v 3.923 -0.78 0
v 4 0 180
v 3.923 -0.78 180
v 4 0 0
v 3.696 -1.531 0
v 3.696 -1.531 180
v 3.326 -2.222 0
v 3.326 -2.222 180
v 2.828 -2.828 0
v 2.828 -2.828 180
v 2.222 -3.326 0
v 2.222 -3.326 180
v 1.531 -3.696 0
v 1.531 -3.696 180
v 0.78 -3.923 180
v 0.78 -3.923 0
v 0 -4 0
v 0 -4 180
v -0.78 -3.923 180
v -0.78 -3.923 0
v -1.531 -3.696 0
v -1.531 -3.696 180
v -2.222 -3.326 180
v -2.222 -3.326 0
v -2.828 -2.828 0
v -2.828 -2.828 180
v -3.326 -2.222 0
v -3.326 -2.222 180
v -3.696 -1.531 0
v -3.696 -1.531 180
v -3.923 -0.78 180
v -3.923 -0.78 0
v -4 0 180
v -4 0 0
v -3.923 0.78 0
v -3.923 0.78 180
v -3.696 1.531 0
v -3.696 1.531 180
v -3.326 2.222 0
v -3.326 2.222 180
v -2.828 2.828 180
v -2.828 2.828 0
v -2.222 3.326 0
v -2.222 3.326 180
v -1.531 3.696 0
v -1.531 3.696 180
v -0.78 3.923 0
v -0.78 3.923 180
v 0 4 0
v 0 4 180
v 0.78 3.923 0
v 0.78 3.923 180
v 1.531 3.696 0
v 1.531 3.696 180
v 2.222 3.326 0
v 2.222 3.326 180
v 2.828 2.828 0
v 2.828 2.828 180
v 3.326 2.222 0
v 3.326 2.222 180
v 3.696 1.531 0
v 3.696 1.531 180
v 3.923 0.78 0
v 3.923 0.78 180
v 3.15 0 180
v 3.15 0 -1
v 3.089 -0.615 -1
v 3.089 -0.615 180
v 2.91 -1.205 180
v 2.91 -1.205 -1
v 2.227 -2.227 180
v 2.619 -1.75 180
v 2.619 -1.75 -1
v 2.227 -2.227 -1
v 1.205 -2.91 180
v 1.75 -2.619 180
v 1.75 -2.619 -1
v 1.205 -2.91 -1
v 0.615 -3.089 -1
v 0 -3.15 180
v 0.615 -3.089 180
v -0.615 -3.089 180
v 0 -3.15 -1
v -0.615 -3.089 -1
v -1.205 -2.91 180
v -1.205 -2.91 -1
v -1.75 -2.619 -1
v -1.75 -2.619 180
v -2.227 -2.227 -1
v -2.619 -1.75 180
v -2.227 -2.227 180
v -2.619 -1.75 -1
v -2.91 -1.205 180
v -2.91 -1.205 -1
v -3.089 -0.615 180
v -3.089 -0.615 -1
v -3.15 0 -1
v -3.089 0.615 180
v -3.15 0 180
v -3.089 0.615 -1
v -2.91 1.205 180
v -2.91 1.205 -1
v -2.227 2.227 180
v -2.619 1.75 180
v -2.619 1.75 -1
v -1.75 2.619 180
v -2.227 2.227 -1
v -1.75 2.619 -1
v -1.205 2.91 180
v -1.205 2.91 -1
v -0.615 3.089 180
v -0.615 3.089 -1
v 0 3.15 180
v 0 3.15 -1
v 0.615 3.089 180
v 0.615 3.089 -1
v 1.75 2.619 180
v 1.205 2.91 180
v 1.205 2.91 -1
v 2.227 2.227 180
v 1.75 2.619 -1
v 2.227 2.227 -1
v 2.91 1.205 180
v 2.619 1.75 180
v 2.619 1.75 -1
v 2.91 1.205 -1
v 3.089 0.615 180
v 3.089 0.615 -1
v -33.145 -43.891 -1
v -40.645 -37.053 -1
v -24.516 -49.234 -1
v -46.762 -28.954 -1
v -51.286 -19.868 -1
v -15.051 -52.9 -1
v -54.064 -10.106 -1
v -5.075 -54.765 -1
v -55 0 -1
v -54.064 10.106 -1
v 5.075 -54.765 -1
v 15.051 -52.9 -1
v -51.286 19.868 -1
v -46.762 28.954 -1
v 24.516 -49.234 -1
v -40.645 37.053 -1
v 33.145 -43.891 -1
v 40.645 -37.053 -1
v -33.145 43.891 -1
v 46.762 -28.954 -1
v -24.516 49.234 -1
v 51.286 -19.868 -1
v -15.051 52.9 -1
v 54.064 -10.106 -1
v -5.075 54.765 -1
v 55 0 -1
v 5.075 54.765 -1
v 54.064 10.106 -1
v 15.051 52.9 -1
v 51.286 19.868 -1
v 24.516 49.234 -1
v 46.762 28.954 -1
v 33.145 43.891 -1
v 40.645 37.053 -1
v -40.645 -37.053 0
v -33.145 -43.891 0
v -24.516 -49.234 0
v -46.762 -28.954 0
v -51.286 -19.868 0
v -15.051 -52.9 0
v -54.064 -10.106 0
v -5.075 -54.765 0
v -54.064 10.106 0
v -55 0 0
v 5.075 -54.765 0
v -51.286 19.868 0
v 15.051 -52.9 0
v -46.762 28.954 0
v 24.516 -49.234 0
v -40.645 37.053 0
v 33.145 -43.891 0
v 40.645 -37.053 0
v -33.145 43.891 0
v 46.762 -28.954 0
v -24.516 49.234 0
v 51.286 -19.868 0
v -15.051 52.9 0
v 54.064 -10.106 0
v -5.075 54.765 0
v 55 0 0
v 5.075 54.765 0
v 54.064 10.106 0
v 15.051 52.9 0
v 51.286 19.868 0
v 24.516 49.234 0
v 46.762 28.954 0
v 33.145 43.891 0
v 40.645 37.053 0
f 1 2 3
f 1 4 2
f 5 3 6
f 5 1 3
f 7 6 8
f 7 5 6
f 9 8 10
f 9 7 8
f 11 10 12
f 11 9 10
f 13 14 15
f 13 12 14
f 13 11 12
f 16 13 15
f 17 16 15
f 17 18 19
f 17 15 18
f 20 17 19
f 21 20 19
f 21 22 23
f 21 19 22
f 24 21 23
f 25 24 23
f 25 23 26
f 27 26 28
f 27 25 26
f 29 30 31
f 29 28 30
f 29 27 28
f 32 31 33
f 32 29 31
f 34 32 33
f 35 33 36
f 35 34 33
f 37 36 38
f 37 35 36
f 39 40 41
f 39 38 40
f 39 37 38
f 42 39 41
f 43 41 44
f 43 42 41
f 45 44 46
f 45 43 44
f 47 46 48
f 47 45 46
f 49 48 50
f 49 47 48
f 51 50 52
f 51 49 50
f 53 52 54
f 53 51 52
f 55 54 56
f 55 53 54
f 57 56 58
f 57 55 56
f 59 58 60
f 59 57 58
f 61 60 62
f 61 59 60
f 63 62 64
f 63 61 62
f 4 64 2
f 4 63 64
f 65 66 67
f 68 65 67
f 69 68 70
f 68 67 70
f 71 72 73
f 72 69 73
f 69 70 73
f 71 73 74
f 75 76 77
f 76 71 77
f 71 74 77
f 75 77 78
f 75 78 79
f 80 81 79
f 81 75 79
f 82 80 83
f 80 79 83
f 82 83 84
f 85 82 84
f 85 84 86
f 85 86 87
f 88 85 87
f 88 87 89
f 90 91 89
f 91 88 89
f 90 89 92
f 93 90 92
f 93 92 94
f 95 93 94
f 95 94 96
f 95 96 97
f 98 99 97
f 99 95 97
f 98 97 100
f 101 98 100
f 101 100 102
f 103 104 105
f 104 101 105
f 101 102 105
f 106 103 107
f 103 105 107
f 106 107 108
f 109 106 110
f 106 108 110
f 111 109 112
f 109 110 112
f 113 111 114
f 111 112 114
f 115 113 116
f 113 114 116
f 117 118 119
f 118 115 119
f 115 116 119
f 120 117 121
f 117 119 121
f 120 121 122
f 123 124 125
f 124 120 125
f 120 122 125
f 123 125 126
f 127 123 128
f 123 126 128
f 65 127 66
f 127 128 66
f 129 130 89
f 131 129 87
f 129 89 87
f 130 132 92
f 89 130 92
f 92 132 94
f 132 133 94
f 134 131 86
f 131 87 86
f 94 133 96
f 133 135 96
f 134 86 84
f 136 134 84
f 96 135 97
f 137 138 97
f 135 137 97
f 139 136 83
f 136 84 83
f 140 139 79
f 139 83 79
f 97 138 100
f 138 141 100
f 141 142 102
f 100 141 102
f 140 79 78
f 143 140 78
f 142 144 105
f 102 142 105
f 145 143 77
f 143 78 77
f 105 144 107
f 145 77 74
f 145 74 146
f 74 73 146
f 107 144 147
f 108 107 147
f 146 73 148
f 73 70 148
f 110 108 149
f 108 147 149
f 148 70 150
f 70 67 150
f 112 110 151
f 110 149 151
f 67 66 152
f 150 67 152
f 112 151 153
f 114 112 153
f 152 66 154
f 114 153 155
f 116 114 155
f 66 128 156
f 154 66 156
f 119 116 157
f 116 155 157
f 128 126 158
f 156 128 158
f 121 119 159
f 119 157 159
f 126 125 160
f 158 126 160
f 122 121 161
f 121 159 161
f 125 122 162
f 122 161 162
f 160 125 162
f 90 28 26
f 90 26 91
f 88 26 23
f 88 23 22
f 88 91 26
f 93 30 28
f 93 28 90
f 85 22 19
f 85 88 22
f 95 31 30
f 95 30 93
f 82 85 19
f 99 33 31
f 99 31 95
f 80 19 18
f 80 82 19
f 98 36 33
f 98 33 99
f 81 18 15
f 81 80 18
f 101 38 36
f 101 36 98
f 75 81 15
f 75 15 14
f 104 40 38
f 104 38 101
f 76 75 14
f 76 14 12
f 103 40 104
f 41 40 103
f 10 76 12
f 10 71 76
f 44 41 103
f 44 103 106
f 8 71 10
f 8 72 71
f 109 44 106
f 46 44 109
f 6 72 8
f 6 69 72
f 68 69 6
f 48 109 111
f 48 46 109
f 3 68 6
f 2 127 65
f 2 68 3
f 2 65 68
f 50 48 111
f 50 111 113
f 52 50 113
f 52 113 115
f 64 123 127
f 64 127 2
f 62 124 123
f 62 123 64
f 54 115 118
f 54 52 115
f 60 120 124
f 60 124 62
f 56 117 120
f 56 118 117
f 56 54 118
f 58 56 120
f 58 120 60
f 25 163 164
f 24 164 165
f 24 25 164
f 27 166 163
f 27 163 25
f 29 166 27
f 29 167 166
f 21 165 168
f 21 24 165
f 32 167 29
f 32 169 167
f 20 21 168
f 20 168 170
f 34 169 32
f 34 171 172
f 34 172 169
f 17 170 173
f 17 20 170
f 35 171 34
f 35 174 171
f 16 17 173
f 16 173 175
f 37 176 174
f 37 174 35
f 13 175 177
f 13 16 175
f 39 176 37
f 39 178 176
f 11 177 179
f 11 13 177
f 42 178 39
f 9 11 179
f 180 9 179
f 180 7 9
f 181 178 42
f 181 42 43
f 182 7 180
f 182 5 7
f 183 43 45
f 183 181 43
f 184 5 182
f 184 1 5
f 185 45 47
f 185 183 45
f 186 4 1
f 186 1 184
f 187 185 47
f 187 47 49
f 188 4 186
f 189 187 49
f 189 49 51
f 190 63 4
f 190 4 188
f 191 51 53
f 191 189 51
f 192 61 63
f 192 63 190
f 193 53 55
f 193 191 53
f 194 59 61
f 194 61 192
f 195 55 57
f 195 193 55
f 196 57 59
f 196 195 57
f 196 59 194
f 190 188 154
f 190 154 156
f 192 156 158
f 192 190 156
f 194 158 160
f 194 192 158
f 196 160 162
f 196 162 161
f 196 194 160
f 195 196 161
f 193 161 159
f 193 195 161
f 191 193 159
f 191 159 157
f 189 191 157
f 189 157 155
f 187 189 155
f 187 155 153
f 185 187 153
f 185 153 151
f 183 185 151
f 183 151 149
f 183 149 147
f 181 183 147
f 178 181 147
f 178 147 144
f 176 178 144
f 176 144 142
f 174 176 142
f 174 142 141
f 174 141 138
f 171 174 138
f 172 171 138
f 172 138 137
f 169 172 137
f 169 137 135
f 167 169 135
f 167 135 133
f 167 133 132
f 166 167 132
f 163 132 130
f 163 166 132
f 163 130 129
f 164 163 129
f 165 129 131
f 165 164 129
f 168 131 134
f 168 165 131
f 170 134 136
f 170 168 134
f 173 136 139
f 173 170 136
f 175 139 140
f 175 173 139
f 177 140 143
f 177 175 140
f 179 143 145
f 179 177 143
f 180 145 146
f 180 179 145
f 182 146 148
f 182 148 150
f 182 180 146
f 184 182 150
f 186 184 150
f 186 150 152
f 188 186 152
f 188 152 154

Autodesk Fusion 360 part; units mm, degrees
sketch "Sketch1" plane through (0, 0, 0) normal (0, 0, 1) x (1, 0, 0)
  circle A0 centre (0, 0) radius 55
  circle A1 centre (0, 0) radius 4
  circle A2 centre (0, 0) radius 3.15
  dimension "d1" = 110
  dimension "d2" = 8
  dimension "d3" = 6.3
extrude "Extrude1" add sketch "Sketch1" against normal blind 1 contours A0
extrude "Extrude2" add sketch "Sketch1" against normal blind 1 contours A1
extrude "Extrude3" add sketch "Sketch1" along normal blind 180 contours A1
equation "d3 = 8 mm - 1.7 mm"
